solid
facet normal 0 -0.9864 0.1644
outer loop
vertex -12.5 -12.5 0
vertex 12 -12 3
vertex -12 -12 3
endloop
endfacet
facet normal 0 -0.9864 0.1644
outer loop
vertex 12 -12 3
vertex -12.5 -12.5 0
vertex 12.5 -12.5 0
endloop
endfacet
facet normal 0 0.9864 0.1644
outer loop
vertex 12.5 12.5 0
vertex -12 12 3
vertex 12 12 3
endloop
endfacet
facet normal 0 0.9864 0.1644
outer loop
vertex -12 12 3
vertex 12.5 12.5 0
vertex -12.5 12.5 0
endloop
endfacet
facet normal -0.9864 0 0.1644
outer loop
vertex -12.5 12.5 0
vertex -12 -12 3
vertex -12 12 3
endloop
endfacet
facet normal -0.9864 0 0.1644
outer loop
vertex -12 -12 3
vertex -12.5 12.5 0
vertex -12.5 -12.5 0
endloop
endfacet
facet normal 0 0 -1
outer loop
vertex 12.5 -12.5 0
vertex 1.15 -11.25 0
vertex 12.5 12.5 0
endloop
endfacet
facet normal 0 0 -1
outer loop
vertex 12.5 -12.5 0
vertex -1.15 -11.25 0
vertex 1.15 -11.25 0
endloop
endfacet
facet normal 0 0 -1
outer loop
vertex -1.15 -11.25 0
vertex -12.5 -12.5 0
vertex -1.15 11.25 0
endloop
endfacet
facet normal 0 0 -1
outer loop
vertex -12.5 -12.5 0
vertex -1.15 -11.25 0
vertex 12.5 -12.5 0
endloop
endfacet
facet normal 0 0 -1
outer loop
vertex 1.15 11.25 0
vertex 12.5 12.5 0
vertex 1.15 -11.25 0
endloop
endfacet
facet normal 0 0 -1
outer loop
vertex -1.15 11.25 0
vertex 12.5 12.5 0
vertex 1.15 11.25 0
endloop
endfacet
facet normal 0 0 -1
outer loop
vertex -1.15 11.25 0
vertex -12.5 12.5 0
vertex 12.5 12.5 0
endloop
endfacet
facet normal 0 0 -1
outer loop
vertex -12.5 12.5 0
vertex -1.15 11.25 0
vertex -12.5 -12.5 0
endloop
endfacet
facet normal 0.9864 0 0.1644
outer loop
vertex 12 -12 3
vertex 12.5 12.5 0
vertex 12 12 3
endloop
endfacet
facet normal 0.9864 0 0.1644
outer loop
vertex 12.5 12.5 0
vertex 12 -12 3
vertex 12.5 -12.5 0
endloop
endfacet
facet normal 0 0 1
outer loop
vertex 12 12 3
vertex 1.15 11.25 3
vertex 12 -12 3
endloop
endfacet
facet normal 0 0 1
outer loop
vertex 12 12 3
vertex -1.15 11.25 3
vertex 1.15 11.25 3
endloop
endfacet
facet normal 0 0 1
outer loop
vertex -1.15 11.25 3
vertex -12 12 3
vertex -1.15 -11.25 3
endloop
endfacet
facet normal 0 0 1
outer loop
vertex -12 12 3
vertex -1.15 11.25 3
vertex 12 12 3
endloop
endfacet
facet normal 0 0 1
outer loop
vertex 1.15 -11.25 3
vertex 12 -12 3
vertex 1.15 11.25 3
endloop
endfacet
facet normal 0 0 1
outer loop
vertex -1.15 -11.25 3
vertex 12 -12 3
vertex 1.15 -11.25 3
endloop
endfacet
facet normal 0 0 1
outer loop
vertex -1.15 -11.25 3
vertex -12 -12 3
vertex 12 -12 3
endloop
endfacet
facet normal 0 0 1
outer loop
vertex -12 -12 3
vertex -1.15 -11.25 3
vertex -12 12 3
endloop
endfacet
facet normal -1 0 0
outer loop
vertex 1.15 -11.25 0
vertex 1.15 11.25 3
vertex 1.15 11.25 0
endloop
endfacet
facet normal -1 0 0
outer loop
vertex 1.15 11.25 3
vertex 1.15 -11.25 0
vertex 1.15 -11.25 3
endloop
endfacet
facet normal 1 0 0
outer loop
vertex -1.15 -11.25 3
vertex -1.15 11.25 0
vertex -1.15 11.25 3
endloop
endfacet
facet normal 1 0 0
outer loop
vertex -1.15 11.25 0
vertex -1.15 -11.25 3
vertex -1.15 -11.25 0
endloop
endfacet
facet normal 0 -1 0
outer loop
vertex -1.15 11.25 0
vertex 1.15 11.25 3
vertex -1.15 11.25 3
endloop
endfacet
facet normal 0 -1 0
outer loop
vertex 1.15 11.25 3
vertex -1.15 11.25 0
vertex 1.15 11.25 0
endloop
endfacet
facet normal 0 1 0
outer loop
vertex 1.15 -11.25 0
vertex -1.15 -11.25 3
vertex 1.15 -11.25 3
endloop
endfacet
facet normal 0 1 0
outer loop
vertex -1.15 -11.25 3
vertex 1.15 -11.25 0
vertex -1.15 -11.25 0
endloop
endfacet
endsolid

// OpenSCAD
// Base generator and customizer script
// developed by Daniel Joyce
// 3D-Miniatures.com

/* [Global] */

// Polygon
base_style = 4; // [3:triangle,4:square,5:pentagon,6:hexagon,7:heptagon,8:octagon,50:round]

// Base diameter, 
diameter = 25; // [15:250]

// Thickness of base, ~3 mm is std
thickness = 3; // [1:25]

// Should base have a slot
slot = 1; // [1:yes, 2:no]

// Orientation of slot
slot_orientation = 1; // [1:sides, 2:verts]

// Normally 25 mm square / hex base diameter is measured side to side
across_sides = 1; // [0:no, 1:yes]

// Number of rows of bases
rows = 1; // [1:10]

// Number of columns of bases
columns = 1; // [1:10]


/* [Hidden] */

radius = diameter / 2;

cos_r = cos(360/(2*base_style));

scale_factor = across_sides == 0 ? 1 : 1 / cos_r;

offset = (diameter * scale_factor) + 2;

module base(sides, 
	diameter = 25, 
	slot = false, 
	height = 3.33,
	slot_x = true,
	inset = false ){
	radius = diameter / 2;
	cos_r = cos(360/(2*sides));

	scale_factor = inset ? 1 : 1 / cos_r;
	slot_width = cos(360/(2*sides))*diameter*0.9*scale_factor;
	even = sides % 2 == 0;
	slot_angle = even ? 360 / (2*sides) : 90;
	slot_r = slot_x ? 0 : slot_angle;
	difference(){
		scale([scale_factor,scale_factor,1]) rotate([0,0,360/(2*sides)]) cylinder(h = height, r1=radius, r2=radius-0.5, $fn=sides);
		if(slot){
			rotate([0,0, slot_r]) cube([2.3,slot_width,height+10], center=true);
		}
	}
}

module make_x_by_y(x,y,offset){
	for(j = [0:y]){
		for(i = [0:x]){
			translate([i*offset,j*offset,0]) child(0);
		}
	}
	
}

make_x_by_y(rows - 1,columns - 1,offset){
	base(base_style, 
		diameter = diameter, 
		slot = (slot==1),
		height = thickness,
		inset = (across_sides == 0),
		slot_x = (slot_orientation==1) );
}
